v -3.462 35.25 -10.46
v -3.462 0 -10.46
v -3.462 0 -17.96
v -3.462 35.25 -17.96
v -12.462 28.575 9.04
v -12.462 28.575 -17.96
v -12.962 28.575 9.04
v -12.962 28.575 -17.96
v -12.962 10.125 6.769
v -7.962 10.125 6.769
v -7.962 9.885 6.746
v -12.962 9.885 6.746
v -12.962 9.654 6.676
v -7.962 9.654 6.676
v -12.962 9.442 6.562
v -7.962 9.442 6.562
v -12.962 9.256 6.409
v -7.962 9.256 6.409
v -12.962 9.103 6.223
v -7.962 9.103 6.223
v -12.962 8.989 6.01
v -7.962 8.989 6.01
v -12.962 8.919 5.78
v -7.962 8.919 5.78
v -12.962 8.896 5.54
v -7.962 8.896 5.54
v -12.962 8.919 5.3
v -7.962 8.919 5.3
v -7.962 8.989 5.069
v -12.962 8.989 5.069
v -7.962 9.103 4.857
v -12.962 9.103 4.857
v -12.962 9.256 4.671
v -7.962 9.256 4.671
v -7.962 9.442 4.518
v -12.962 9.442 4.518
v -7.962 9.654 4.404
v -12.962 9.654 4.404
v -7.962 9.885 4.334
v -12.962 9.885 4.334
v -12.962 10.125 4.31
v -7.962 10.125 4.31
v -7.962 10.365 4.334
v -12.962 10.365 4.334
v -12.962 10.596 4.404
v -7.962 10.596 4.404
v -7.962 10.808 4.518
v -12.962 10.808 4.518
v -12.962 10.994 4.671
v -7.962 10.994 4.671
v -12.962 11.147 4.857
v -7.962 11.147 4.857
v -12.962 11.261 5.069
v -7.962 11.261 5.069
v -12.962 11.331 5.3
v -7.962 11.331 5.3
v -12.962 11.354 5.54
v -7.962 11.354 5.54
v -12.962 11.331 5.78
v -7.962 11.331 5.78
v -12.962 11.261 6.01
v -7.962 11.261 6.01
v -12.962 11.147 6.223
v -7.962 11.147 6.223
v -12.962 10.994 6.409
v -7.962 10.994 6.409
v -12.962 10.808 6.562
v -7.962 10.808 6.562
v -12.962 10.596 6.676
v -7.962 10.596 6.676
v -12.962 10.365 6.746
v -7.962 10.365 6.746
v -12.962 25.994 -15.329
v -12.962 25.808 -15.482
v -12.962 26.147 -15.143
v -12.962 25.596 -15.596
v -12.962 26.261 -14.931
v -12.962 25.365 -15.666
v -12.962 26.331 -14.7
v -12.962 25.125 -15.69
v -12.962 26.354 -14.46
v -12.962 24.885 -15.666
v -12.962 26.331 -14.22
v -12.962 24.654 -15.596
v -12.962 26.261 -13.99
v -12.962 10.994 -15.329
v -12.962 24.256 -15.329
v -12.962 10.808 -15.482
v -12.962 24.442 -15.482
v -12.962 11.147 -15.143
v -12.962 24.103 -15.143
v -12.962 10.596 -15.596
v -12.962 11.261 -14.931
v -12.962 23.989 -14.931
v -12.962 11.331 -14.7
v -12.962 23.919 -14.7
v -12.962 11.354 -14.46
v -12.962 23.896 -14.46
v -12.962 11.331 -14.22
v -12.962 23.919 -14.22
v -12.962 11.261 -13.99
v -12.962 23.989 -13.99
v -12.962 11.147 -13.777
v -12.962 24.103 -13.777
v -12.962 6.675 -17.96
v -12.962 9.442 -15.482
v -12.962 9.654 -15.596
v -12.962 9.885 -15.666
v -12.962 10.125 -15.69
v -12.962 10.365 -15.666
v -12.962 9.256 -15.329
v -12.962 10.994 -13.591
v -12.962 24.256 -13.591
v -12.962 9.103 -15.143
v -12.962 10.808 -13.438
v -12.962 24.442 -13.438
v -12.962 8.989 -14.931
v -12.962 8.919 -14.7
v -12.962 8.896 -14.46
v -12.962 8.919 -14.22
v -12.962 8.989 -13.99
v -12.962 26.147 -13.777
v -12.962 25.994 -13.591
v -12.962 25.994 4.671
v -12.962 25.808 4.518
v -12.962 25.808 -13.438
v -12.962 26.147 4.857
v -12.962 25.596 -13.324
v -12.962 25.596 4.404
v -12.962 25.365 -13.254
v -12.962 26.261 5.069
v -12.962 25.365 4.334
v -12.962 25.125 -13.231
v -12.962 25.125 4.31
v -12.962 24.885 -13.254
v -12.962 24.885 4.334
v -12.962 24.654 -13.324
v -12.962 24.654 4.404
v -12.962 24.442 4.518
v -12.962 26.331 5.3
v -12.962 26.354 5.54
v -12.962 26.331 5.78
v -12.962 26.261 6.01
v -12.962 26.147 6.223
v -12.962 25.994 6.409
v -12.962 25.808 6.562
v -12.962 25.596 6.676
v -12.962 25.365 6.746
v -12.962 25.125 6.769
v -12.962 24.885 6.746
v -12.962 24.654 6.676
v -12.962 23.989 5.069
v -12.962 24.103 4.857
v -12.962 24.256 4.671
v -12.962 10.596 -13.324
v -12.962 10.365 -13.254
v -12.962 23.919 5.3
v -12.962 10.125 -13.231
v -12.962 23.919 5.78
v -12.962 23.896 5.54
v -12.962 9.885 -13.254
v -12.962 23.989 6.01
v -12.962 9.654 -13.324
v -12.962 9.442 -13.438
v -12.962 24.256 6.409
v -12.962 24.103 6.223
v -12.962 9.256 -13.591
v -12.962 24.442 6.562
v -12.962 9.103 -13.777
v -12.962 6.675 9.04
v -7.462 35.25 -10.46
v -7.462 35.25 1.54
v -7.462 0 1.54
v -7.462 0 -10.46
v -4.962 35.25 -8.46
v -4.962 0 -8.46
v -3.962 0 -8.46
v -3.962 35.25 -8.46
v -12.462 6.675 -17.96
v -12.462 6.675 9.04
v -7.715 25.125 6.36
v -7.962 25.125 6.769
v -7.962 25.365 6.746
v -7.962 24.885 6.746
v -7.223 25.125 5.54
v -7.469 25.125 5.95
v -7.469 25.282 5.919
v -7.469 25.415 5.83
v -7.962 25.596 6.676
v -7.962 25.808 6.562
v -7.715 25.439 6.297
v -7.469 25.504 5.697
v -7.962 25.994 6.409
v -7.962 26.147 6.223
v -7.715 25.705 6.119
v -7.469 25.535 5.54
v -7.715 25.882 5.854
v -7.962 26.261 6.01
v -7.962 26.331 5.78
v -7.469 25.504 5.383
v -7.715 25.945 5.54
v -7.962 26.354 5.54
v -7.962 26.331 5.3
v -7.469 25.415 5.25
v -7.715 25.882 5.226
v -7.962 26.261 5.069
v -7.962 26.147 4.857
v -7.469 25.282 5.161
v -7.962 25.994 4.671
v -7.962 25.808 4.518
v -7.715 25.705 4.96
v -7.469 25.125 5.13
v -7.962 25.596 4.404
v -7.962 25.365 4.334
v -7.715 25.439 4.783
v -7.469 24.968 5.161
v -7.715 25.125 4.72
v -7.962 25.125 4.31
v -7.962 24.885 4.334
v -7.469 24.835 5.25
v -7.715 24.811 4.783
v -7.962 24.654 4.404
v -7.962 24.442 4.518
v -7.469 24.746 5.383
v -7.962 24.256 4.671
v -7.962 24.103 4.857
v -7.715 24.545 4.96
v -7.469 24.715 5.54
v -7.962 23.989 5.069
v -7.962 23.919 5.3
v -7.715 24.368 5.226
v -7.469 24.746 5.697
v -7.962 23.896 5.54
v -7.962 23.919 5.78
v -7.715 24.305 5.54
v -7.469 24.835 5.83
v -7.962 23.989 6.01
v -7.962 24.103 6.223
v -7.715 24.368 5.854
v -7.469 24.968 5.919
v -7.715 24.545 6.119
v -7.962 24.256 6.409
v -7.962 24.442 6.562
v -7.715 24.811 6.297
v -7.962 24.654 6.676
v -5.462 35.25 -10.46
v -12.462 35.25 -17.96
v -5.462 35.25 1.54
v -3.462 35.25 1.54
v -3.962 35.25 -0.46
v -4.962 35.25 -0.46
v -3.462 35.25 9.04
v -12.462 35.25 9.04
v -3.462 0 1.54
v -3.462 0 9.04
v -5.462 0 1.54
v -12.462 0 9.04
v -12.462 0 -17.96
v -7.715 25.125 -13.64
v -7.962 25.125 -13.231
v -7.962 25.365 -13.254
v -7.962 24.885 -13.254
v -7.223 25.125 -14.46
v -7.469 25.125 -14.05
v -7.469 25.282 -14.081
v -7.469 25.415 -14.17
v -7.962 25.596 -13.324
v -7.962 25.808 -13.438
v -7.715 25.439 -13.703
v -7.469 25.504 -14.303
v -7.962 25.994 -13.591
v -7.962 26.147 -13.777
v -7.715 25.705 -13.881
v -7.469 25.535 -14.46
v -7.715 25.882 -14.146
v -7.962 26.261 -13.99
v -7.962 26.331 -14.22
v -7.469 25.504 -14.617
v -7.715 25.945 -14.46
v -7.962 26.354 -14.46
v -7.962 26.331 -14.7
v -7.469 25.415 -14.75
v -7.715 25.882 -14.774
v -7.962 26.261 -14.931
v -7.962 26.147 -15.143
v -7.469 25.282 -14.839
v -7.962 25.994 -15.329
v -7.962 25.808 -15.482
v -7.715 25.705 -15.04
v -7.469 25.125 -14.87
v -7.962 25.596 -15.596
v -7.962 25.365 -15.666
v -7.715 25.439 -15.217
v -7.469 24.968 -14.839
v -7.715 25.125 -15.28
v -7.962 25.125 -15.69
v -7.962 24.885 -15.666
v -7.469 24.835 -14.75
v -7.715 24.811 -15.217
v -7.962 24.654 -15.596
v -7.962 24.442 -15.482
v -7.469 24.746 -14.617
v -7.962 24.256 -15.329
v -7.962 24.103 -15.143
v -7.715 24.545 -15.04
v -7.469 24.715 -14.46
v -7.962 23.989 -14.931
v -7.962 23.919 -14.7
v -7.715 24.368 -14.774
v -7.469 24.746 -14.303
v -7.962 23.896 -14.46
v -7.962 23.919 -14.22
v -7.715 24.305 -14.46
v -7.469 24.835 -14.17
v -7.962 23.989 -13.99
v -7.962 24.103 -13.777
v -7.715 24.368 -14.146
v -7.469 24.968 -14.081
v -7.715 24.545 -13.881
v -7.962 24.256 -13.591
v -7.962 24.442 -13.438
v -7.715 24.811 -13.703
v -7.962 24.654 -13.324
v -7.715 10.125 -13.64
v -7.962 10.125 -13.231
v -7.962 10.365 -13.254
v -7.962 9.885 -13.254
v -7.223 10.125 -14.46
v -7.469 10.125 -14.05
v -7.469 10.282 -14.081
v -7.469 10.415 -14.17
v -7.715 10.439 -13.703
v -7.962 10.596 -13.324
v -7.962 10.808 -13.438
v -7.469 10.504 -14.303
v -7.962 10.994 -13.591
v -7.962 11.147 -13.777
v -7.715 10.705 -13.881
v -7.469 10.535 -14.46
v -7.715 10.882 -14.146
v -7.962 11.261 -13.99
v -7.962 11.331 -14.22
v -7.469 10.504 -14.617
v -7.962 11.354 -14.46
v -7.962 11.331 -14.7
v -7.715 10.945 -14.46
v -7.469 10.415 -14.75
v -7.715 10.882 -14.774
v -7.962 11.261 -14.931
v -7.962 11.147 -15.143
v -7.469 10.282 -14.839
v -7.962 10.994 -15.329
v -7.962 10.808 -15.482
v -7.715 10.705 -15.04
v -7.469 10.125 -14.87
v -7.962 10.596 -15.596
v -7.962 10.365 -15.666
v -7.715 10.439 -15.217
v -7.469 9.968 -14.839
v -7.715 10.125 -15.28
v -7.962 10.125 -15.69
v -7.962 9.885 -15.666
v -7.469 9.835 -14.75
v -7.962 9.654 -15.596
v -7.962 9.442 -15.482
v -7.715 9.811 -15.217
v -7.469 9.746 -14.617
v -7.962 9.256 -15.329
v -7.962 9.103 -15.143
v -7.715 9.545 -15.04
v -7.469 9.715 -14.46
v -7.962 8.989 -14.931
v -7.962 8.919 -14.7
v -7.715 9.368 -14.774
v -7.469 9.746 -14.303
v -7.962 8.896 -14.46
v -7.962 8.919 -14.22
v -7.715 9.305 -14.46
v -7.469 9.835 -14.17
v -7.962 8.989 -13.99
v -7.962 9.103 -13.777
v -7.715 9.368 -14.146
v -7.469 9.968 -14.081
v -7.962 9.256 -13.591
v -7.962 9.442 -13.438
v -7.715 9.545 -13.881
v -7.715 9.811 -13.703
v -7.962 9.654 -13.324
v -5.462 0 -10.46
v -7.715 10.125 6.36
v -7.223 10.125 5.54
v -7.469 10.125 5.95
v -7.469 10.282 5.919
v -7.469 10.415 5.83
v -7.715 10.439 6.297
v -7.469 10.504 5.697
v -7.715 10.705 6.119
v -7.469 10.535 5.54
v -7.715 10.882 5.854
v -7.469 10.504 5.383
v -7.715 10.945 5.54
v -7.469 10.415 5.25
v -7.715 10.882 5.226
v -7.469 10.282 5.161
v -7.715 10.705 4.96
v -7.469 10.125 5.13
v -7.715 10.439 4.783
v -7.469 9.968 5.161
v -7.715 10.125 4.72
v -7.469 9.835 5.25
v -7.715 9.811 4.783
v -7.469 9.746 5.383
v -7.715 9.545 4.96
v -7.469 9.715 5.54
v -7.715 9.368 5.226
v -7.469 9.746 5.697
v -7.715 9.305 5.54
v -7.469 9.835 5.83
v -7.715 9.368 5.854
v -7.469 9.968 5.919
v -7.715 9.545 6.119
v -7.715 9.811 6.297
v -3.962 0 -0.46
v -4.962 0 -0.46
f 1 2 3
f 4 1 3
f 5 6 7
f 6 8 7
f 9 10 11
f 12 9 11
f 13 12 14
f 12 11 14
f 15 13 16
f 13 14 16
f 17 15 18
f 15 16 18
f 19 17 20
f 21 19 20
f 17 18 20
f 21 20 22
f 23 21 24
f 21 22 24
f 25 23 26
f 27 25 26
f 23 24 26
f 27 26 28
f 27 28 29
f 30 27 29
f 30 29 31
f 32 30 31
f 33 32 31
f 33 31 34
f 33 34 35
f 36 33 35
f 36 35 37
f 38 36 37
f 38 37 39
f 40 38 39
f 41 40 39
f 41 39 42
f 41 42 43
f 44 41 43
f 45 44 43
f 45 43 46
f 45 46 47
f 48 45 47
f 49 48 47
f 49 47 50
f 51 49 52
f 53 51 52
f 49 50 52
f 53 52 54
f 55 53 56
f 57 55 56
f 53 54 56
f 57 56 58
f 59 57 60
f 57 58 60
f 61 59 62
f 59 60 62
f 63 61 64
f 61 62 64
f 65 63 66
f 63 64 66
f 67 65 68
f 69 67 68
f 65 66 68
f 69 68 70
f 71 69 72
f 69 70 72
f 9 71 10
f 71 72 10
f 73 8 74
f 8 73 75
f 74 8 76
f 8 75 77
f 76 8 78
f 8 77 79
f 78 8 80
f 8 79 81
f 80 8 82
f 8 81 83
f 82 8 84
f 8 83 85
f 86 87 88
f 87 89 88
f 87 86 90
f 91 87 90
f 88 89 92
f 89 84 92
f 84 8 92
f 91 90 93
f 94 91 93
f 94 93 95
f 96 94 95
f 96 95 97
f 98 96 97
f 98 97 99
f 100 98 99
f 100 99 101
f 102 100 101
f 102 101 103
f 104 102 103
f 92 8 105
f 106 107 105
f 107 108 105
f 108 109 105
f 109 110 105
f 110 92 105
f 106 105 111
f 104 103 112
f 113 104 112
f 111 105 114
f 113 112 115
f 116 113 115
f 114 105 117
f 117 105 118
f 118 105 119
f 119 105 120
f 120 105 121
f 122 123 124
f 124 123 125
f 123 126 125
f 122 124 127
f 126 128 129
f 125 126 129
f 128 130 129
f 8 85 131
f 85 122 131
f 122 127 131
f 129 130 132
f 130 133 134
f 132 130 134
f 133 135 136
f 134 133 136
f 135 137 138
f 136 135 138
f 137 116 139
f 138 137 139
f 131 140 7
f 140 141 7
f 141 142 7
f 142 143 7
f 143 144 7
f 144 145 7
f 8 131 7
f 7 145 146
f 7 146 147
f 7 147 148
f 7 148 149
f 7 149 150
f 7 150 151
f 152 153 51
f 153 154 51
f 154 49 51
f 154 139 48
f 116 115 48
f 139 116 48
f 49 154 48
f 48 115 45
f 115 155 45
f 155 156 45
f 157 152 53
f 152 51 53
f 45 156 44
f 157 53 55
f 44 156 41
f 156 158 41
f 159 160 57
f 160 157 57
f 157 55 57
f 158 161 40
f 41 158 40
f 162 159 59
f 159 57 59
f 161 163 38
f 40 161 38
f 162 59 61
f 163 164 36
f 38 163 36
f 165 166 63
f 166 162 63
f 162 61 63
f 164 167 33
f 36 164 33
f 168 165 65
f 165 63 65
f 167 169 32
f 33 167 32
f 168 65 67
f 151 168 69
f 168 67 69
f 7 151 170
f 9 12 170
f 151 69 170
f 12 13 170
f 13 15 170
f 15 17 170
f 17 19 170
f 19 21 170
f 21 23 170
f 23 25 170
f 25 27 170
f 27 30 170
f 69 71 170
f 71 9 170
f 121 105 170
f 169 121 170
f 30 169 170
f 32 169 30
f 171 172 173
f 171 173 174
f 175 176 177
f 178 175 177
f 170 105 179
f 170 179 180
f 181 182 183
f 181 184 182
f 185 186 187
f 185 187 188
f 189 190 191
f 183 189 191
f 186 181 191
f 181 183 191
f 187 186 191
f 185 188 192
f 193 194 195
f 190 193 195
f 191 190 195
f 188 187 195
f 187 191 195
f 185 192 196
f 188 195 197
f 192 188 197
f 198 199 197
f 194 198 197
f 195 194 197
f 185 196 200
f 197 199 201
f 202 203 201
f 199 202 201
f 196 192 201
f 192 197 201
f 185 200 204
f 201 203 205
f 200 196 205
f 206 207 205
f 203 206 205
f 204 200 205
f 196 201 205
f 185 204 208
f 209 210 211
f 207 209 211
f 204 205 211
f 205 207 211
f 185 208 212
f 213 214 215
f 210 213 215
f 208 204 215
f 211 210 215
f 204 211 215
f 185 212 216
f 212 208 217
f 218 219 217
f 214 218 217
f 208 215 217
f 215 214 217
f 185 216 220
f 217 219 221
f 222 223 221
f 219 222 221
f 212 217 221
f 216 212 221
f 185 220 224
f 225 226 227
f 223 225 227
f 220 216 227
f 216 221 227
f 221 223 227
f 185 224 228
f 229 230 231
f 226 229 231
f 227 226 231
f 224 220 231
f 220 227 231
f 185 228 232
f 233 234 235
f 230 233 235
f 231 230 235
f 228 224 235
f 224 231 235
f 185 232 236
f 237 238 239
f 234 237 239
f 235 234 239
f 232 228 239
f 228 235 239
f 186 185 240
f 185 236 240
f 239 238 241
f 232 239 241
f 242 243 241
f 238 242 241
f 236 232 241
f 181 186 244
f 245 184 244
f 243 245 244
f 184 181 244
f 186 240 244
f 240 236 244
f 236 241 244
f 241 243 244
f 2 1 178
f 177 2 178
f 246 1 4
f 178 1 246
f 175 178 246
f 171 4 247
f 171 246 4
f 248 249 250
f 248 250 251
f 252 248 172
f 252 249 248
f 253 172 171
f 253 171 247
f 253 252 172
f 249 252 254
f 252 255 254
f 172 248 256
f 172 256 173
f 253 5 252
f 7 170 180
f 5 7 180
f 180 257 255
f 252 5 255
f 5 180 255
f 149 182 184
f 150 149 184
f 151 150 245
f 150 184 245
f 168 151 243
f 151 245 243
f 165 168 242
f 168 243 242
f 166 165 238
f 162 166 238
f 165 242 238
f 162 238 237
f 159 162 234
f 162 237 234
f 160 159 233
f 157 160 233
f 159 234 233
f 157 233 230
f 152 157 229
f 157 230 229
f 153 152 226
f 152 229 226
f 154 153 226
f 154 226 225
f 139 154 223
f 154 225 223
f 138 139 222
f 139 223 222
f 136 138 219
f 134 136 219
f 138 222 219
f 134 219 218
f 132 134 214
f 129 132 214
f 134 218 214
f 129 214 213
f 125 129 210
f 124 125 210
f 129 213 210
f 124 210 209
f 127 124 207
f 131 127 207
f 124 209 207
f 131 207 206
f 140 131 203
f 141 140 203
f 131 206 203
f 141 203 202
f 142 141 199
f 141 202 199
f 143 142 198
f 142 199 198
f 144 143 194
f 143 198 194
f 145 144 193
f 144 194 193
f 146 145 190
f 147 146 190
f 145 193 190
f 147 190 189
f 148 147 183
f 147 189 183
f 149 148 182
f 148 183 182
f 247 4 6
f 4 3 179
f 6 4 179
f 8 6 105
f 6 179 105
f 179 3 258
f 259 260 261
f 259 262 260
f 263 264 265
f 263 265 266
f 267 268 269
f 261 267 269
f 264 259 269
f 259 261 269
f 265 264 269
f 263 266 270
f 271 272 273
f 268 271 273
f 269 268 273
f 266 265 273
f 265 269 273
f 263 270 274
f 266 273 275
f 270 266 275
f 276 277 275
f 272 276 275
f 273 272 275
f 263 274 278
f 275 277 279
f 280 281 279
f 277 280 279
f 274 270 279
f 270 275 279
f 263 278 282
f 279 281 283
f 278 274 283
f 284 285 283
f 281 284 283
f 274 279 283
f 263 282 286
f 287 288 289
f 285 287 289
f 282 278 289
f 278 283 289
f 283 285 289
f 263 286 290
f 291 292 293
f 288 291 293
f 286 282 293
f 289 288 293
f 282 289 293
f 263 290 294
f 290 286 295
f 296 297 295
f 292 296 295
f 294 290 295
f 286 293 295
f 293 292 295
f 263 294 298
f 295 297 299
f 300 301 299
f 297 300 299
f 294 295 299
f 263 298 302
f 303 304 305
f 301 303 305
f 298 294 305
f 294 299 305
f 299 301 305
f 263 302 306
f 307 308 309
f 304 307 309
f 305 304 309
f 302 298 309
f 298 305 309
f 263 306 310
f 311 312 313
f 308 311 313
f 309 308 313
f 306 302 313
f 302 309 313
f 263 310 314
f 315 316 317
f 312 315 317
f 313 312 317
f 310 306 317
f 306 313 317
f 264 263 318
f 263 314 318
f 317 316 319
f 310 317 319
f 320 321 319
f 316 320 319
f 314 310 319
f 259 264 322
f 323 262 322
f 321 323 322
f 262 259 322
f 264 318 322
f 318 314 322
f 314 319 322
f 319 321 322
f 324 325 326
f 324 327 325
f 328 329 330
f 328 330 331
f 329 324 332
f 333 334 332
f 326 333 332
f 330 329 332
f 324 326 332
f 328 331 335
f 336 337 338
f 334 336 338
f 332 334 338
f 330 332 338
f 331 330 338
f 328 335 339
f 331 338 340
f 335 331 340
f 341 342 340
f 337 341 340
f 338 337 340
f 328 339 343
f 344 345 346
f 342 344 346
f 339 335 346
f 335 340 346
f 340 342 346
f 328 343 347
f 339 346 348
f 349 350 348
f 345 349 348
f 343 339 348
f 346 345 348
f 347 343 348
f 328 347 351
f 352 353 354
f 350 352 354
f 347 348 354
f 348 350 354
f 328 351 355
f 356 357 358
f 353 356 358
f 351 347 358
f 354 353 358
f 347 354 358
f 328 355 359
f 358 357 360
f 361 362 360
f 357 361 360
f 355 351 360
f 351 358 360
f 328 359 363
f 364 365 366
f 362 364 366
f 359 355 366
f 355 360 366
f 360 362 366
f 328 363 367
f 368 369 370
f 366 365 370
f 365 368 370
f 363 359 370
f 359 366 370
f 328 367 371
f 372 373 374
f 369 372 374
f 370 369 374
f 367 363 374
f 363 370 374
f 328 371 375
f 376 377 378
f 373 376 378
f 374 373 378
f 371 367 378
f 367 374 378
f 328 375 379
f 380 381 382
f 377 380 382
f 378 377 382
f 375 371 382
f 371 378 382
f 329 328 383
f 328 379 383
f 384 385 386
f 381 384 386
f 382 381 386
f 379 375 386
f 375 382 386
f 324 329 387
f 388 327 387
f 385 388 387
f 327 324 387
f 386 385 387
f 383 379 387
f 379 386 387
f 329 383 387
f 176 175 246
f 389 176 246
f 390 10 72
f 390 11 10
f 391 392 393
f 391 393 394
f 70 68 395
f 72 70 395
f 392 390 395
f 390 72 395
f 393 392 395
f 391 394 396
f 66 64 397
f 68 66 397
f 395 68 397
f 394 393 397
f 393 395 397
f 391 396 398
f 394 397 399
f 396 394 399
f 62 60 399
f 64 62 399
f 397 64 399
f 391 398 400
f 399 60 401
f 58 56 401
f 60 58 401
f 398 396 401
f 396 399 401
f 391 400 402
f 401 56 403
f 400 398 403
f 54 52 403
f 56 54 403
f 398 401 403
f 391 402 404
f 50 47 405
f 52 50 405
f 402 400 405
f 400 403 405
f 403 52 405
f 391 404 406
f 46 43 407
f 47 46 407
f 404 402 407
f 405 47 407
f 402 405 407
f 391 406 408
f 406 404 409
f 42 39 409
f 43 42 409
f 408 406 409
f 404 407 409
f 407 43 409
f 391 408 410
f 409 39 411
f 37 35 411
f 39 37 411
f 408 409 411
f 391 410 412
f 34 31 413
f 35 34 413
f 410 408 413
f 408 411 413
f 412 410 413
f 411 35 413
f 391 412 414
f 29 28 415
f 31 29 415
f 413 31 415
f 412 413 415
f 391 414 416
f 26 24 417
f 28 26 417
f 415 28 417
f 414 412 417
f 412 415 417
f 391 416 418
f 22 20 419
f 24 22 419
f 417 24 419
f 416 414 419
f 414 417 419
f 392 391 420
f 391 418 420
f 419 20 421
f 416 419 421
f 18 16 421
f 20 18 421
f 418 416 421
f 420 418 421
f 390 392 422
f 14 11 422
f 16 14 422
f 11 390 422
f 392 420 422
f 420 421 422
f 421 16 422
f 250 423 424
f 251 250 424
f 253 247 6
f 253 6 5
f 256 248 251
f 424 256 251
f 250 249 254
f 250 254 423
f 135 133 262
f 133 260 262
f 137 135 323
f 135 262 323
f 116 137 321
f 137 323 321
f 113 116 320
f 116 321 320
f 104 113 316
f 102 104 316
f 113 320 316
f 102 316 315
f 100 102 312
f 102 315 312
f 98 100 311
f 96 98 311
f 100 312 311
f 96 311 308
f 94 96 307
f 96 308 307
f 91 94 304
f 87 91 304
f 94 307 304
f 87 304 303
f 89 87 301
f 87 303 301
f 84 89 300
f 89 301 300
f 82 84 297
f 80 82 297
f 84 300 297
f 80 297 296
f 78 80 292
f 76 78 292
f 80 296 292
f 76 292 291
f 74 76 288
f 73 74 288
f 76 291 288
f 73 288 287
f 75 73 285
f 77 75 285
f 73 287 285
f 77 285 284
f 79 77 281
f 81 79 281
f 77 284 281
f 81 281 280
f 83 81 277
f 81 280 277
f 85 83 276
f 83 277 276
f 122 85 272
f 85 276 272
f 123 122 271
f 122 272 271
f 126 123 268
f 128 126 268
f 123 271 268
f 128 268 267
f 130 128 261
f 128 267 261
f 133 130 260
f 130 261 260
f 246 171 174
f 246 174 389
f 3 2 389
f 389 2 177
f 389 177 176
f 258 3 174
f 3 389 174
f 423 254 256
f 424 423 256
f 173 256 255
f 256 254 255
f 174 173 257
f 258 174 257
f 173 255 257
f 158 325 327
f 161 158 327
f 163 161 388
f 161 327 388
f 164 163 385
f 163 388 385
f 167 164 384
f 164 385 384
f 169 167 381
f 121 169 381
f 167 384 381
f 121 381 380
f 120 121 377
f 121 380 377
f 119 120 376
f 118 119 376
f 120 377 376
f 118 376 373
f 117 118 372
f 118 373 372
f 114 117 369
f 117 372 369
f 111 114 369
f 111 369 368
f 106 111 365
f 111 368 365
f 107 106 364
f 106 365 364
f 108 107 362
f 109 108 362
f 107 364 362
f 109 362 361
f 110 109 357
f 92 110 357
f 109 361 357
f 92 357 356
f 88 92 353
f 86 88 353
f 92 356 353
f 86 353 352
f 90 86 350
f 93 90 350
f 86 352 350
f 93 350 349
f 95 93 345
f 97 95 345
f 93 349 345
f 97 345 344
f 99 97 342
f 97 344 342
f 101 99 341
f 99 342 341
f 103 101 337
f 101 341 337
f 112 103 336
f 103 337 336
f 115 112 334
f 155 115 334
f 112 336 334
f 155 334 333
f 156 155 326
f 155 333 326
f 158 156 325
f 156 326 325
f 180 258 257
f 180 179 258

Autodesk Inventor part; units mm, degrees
ref_plane "YZ Plane" through (0, 0, 0) normal (1, 0, 0) x (0, 1, 0)
ref_plane "XZ Plane" through (0, 0, 0) normal (0, 1, 0) x (-1, 0, 0)
ref_plane "XY Plane" through (0, 0, 0) normal (0, 0, 1) x (1, 0, 0)
sketch "Sketch1" plane through (0, 0, 0) normal (0, 1, 0) x (-1, 0, 0)
  line L0 (3.9616, -0.4601) -> (4.9616, -0.4601)
  line L1 (5.4616, 1.5399) -> (7.4616, 1.5399)
  line L2 (7.4616, 1.5399) -> (7.4616, -10.4601)
  line L3 (7.4616, -10.4601) -> (5.4616, -10.4601)
  line L4 (4.9616, -8.4601) -> (3.9616, -8.4601)
  line L5 (5.4616, 1.5399) -> (4.9616, -0.4601)
  line L6 (3.4616, 1.5399) -> (3.9616, -0.4601)
  line L7 (4.9616, -8.4601) -> (5.4616, -10.4601)
  line L8 (3.4616, -10.4601) -> (3.9616, -8.4601)
  line L9 (3.4616, -10.4601) -> (3.4616, -17.9601)
  line L10 (3.4616, -17.9601) -> (12.9616, -17.9601)
  line L11 (12.9616, -17.9601) -> (12.9616, 9.0399)
  line L12 (12.9616, 9.0399) -> (3.4616, 9.0399)
  line L13 (3.4616, 9.0399) -> (3.4616, 1.5399)
  point P0 (0, 0)
  point P1 (12.9616, -4.4601)
  point P2 (7.4616, -4.4601)
  point P3 (6.4616, -10.4601)
  dimension "d2" = 8
  dimension "d3" = 1
  dimension "d5" = 0.5
  dimension "d6" = 4
  dimension "d8" = 9.5
  dimension "d9" = 27
  dimension "d12" = 0
  dimension "d13" = 12
  dimension "d14" = 2
  dimension "d15" = 2
extrude "Extrusion1" add sketch "Sketch1" along normal blind 35.25
sketch "Sketch2" plane through (-12.9616, 0, -17.9601) normal (-1, 0, 0) x (0, 0, 1)
  line L0 (0, 35.25) -> (27, 35.25) projected
  line L1 (0, 0) -> (0, 35.25) projected
  point P0 (17.9601, 0)
  point P1 (3.5, 25.125)
  point P2 (23.5, 25.125)
  point P3 (23.5, 10.125)
  point P4 (3.5, 10.125)
  dimension "d16" = 20
  dimension "d17" = 20
  dimension "d18" = 15
  dimension "d19" = 15
  dimension "d20" = 0
  dimension "d21" = 0
  dimension "d22" = 35.25
  dimension "d23" = 27
  dimension "d24" = 10.125
  dimension "d25" = 3.5
hole "Hole1" at (-12.9616, 25.125, -14.4601) at (-12.9616, 25.125, 5.5399) at (-12.9616, 10.125, 5.5399) at (-12.9616, 10.125, -14.4601) direction (1, 0, 0) diameter 2.459 depth 5 tip angle 118 thread size "M3x0.5" class "6H" standard "ISO Metric profile"
sketch "Sketch3" plane through (-12.9616, 0, -17.9601) normal (-1, 0, 0) x (0, 0, 1)
  line L0 (0, 35.25) -> (27, 35.25) projected
  line L1 (0, 0) -> (0, 35.25) projected
  line L2 (27, 35.25) -> (0, 35.25)
  line L3 (0, 35.25) -> (0, 28.575)
  line L4 (0, 28.575) -> (27, 28.575)
  line L5 (27, 28.575) -> (27, 35.25)
  line L6 (27, 0) -> (0, 0)
  line L7 (0, 0) -> (0, 6.675)
  line L8 (0, 6.675) -> (27, 6.675)
  line L9 (27, 6.675) -> (27, 0)
  point P0 (17.9601, 0)
  point P1 (0, 6.675)
  dimension "d33" = 35.25
  dimension "d34" = 21.9
  dimension "d35" = 6.675
extrude "Extrusion2" cut sketch "Sketch3" against normal blind 0.5
equation "\"d24\" = -0.5 * d18 + 0.5 * d22"
equation "\"d25\" = -0.5 * d16 + 0.5 * d23"
equation "\"d35\" = -0.5 * d34 + 0.5 * d33"
equation "\"GapSize\" = Thickness"
equation "\"BendRadius\" = Thickness"
equation "\"MinimumRemnant\" = 2 * Thickness"
equation "\"BendReliefDepth\" = 0.5 * Thickness"
equation "\"BendReliefWidth\" = Thickness"
equation "\"CornerReliefSize\" = 4 * Thickness"
equation "\"JacobiRadiusSize\" = BendRadius"
equation "\"TransitionRadius\" = BendRadius"
equation "\"Thickness\" = 0.5"
properties part number "Guia do trilho" material "Steel, Alloy"
